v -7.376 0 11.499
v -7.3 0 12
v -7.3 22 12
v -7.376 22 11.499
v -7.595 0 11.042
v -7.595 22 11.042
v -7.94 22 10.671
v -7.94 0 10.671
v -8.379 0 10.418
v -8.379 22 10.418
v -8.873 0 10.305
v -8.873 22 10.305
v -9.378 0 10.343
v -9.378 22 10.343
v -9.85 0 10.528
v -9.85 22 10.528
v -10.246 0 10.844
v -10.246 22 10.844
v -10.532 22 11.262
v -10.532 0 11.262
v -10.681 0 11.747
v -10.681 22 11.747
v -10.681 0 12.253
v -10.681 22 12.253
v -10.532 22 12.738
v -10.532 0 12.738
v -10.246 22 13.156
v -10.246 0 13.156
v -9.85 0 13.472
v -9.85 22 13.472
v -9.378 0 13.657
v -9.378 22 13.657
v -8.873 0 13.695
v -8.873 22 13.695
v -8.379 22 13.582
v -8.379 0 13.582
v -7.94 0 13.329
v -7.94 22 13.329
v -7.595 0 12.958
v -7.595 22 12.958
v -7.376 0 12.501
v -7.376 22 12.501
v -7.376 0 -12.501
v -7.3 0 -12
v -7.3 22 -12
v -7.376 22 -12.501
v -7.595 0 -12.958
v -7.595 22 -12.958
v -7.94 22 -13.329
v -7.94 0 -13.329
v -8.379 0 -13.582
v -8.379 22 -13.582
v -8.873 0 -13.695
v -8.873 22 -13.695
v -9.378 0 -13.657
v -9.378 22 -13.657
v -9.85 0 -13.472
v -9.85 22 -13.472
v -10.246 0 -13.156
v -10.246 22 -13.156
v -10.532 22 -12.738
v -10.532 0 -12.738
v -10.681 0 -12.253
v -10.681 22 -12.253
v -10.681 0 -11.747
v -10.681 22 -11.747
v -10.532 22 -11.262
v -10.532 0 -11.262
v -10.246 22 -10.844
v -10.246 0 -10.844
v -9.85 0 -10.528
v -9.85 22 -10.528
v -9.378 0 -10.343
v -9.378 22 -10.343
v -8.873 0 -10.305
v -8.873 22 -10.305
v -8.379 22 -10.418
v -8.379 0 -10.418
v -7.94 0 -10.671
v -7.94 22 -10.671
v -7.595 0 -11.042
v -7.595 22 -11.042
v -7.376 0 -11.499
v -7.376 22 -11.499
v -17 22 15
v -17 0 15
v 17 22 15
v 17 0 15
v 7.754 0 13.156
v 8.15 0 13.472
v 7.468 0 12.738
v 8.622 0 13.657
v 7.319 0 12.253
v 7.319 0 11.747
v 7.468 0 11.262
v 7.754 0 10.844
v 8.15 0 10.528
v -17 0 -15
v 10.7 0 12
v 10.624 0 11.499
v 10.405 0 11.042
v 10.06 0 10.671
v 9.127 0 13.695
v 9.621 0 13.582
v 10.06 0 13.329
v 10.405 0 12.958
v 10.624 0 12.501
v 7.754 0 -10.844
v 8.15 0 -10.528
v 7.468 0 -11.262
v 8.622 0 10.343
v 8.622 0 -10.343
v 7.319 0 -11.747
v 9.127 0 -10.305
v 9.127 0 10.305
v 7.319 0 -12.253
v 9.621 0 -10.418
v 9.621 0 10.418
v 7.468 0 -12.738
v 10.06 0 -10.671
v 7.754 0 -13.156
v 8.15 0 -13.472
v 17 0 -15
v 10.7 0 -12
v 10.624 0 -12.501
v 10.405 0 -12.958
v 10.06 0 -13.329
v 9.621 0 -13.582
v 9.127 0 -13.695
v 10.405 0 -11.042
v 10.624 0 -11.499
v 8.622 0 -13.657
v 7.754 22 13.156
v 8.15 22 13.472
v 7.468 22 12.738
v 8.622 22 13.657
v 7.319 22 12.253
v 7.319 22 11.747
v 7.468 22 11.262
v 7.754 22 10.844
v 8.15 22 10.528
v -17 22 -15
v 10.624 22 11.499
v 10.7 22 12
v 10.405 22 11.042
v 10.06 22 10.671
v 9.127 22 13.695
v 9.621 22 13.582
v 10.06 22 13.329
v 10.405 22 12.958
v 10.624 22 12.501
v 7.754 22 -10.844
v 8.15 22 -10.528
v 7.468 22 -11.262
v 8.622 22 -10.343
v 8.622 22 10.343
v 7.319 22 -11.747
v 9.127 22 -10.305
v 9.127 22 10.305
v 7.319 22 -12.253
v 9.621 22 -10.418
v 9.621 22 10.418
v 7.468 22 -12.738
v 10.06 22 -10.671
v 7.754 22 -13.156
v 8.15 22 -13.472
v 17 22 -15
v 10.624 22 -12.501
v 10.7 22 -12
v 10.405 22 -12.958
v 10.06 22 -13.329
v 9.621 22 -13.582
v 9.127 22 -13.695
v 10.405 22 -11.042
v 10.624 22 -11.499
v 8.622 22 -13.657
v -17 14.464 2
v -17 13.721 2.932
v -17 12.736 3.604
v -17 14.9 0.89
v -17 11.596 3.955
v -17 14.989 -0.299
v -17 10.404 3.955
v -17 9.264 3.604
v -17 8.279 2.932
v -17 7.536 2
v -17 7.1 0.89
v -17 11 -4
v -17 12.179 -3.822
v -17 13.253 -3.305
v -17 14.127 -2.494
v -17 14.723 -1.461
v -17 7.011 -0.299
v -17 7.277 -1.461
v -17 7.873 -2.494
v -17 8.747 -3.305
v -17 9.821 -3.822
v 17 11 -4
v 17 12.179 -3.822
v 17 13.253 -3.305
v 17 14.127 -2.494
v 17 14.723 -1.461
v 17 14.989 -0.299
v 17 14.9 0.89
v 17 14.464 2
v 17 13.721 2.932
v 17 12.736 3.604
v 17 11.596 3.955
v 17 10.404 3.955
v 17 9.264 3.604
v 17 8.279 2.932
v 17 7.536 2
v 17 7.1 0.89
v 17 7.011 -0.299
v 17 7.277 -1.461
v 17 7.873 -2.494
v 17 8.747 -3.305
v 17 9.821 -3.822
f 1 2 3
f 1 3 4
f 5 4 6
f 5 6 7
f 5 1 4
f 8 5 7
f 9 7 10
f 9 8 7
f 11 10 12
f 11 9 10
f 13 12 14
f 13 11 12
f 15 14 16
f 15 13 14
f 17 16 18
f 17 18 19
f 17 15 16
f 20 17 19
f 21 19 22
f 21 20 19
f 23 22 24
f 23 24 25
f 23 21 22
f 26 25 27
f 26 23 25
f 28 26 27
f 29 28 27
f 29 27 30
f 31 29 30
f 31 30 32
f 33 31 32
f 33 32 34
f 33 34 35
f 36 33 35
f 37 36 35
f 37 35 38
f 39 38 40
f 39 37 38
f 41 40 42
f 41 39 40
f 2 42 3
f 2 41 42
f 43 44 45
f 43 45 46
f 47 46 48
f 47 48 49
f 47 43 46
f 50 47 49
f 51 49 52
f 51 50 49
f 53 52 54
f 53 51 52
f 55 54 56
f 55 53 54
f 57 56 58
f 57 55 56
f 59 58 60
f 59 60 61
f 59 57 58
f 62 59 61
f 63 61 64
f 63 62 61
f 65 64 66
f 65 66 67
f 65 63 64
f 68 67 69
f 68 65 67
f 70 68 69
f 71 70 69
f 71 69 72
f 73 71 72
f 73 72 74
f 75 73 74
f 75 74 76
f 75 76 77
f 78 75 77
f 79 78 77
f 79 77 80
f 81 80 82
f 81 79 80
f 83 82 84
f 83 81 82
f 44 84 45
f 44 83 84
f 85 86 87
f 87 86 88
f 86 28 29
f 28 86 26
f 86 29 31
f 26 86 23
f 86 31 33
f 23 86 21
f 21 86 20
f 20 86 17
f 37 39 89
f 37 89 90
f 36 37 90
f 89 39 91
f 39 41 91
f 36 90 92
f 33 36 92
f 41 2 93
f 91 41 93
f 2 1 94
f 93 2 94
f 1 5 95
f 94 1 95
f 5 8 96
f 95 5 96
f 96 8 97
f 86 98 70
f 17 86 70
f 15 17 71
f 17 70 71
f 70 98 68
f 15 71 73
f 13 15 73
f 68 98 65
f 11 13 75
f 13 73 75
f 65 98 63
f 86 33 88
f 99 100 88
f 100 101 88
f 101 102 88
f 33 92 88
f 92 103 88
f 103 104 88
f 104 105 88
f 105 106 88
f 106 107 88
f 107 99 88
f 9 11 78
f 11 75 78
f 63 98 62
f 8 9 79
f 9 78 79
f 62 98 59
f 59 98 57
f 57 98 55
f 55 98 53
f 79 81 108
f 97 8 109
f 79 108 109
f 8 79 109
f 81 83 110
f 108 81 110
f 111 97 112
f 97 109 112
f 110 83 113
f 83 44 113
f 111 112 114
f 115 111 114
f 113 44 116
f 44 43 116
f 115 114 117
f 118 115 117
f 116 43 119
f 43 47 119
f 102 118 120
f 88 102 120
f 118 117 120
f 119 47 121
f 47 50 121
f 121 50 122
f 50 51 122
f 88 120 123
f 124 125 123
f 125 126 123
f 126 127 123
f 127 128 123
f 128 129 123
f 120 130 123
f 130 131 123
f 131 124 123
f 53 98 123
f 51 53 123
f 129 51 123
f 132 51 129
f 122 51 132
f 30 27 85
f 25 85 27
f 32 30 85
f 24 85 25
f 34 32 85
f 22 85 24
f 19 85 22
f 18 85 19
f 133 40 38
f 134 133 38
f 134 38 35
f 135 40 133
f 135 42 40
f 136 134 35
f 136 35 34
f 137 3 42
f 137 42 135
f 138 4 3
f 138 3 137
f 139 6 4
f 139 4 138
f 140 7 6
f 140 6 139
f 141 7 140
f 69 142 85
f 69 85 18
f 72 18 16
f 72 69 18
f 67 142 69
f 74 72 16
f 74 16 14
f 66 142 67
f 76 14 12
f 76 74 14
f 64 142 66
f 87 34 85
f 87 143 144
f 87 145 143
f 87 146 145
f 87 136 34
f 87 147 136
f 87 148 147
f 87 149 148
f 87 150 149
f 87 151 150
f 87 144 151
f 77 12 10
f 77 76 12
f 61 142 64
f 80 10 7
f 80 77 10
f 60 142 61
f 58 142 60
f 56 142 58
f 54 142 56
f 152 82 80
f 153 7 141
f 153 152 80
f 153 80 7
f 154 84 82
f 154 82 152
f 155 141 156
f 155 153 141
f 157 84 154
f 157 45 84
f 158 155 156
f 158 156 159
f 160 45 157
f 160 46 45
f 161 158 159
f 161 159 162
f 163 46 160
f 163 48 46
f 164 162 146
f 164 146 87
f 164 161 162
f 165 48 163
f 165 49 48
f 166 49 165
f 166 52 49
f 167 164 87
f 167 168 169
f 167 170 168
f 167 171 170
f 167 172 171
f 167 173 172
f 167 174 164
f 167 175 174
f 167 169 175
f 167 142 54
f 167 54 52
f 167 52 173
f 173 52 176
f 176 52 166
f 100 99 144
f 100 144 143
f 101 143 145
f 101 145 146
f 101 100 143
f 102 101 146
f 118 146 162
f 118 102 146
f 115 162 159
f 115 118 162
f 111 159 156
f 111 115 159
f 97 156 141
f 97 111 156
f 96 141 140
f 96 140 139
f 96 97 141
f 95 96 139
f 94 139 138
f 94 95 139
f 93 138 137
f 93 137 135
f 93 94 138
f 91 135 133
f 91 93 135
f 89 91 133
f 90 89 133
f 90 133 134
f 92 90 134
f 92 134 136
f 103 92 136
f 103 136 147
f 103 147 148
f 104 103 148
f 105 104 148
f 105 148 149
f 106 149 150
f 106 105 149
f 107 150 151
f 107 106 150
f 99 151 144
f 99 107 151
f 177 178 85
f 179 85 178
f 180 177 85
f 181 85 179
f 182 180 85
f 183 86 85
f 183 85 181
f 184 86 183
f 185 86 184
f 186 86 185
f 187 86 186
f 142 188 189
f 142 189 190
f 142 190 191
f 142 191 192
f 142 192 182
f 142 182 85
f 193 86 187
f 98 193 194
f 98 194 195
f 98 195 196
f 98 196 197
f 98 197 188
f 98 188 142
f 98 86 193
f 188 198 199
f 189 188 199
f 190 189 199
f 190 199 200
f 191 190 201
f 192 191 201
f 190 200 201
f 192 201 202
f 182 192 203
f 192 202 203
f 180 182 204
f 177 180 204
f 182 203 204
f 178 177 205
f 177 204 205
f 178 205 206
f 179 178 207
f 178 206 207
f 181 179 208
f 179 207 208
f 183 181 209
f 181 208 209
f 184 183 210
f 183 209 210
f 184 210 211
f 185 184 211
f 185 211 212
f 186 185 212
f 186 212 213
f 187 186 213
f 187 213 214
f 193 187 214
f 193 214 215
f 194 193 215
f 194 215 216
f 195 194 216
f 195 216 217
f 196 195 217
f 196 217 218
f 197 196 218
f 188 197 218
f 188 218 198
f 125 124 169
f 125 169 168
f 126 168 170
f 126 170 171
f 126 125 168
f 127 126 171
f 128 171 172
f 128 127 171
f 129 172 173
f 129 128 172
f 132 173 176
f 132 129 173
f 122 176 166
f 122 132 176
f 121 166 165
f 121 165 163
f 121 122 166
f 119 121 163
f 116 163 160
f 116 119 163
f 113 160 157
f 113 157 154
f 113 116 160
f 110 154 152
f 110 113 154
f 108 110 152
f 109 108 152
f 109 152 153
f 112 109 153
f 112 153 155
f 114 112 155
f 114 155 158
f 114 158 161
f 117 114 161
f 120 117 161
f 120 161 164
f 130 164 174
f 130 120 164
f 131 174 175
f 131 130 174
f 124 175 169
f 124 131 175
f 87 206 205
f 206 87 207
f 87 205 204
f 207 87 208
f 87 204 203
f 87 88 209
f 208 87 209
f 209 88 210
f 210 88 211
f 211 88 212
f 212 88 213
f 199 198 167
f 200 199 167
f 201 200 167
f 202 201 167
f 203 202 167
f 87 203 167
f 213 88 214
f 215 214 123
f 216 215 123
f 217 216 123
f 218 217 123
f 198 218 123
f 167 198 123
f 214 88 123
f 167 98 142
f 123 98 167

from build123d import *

# Parameters (mm, degrees)
SKETCH1_W           = 34
SKETCH1_H           = 30
SKETCH1_R           = 1.7
BOSS_EXTRUDE1_DEPTH = 22
SKETCH4_R           = 4
CUT_EXTRUDE2_DEPTH  = 42


with BuildPart() as part:
    # Sketch1 → Boss-Extrude1 (new body)
    with BuildSketch(Plane(origin=(0, 0, 0), x_dir=(1, 0, 0), z_dir=(0, 1, 0))):
        Rectangle(SKETCH1_W, SKETCH1_H)
        with Locations((-9, 12)):
            Circle(SKETCH1_R, mode=Mode.SUBTRACT)
        with Locations((9, 12)):
            Circle(SKETCH1_R, mode=Mode.SUBTRACT)
        with Locations((9, -12)):
            Circle(SKETCH1_R, mode=Mode.SUBTRACT)
        with Locations((-9, -12)):
            Circle(SKETCH1_R, mode=Mode.SUBTRACT)
    extrude(amount=BOSS_EXTRUDE1_DEPTH)

    # Sketch4 → Cut-Extrude2 (cut)
    with BuildSketch(Plane(origin=(17, 0, 0), x_dir=(0, 0, -1), z_dir=(1, 0, 0))):
        with Locations((0, 11)):
            Circle(SKETCH4_R)
    extrude(amount=-CUT_EXTRUDE2_DEPTH, mode=Mode.SUBTRACT)


solid = part.part
